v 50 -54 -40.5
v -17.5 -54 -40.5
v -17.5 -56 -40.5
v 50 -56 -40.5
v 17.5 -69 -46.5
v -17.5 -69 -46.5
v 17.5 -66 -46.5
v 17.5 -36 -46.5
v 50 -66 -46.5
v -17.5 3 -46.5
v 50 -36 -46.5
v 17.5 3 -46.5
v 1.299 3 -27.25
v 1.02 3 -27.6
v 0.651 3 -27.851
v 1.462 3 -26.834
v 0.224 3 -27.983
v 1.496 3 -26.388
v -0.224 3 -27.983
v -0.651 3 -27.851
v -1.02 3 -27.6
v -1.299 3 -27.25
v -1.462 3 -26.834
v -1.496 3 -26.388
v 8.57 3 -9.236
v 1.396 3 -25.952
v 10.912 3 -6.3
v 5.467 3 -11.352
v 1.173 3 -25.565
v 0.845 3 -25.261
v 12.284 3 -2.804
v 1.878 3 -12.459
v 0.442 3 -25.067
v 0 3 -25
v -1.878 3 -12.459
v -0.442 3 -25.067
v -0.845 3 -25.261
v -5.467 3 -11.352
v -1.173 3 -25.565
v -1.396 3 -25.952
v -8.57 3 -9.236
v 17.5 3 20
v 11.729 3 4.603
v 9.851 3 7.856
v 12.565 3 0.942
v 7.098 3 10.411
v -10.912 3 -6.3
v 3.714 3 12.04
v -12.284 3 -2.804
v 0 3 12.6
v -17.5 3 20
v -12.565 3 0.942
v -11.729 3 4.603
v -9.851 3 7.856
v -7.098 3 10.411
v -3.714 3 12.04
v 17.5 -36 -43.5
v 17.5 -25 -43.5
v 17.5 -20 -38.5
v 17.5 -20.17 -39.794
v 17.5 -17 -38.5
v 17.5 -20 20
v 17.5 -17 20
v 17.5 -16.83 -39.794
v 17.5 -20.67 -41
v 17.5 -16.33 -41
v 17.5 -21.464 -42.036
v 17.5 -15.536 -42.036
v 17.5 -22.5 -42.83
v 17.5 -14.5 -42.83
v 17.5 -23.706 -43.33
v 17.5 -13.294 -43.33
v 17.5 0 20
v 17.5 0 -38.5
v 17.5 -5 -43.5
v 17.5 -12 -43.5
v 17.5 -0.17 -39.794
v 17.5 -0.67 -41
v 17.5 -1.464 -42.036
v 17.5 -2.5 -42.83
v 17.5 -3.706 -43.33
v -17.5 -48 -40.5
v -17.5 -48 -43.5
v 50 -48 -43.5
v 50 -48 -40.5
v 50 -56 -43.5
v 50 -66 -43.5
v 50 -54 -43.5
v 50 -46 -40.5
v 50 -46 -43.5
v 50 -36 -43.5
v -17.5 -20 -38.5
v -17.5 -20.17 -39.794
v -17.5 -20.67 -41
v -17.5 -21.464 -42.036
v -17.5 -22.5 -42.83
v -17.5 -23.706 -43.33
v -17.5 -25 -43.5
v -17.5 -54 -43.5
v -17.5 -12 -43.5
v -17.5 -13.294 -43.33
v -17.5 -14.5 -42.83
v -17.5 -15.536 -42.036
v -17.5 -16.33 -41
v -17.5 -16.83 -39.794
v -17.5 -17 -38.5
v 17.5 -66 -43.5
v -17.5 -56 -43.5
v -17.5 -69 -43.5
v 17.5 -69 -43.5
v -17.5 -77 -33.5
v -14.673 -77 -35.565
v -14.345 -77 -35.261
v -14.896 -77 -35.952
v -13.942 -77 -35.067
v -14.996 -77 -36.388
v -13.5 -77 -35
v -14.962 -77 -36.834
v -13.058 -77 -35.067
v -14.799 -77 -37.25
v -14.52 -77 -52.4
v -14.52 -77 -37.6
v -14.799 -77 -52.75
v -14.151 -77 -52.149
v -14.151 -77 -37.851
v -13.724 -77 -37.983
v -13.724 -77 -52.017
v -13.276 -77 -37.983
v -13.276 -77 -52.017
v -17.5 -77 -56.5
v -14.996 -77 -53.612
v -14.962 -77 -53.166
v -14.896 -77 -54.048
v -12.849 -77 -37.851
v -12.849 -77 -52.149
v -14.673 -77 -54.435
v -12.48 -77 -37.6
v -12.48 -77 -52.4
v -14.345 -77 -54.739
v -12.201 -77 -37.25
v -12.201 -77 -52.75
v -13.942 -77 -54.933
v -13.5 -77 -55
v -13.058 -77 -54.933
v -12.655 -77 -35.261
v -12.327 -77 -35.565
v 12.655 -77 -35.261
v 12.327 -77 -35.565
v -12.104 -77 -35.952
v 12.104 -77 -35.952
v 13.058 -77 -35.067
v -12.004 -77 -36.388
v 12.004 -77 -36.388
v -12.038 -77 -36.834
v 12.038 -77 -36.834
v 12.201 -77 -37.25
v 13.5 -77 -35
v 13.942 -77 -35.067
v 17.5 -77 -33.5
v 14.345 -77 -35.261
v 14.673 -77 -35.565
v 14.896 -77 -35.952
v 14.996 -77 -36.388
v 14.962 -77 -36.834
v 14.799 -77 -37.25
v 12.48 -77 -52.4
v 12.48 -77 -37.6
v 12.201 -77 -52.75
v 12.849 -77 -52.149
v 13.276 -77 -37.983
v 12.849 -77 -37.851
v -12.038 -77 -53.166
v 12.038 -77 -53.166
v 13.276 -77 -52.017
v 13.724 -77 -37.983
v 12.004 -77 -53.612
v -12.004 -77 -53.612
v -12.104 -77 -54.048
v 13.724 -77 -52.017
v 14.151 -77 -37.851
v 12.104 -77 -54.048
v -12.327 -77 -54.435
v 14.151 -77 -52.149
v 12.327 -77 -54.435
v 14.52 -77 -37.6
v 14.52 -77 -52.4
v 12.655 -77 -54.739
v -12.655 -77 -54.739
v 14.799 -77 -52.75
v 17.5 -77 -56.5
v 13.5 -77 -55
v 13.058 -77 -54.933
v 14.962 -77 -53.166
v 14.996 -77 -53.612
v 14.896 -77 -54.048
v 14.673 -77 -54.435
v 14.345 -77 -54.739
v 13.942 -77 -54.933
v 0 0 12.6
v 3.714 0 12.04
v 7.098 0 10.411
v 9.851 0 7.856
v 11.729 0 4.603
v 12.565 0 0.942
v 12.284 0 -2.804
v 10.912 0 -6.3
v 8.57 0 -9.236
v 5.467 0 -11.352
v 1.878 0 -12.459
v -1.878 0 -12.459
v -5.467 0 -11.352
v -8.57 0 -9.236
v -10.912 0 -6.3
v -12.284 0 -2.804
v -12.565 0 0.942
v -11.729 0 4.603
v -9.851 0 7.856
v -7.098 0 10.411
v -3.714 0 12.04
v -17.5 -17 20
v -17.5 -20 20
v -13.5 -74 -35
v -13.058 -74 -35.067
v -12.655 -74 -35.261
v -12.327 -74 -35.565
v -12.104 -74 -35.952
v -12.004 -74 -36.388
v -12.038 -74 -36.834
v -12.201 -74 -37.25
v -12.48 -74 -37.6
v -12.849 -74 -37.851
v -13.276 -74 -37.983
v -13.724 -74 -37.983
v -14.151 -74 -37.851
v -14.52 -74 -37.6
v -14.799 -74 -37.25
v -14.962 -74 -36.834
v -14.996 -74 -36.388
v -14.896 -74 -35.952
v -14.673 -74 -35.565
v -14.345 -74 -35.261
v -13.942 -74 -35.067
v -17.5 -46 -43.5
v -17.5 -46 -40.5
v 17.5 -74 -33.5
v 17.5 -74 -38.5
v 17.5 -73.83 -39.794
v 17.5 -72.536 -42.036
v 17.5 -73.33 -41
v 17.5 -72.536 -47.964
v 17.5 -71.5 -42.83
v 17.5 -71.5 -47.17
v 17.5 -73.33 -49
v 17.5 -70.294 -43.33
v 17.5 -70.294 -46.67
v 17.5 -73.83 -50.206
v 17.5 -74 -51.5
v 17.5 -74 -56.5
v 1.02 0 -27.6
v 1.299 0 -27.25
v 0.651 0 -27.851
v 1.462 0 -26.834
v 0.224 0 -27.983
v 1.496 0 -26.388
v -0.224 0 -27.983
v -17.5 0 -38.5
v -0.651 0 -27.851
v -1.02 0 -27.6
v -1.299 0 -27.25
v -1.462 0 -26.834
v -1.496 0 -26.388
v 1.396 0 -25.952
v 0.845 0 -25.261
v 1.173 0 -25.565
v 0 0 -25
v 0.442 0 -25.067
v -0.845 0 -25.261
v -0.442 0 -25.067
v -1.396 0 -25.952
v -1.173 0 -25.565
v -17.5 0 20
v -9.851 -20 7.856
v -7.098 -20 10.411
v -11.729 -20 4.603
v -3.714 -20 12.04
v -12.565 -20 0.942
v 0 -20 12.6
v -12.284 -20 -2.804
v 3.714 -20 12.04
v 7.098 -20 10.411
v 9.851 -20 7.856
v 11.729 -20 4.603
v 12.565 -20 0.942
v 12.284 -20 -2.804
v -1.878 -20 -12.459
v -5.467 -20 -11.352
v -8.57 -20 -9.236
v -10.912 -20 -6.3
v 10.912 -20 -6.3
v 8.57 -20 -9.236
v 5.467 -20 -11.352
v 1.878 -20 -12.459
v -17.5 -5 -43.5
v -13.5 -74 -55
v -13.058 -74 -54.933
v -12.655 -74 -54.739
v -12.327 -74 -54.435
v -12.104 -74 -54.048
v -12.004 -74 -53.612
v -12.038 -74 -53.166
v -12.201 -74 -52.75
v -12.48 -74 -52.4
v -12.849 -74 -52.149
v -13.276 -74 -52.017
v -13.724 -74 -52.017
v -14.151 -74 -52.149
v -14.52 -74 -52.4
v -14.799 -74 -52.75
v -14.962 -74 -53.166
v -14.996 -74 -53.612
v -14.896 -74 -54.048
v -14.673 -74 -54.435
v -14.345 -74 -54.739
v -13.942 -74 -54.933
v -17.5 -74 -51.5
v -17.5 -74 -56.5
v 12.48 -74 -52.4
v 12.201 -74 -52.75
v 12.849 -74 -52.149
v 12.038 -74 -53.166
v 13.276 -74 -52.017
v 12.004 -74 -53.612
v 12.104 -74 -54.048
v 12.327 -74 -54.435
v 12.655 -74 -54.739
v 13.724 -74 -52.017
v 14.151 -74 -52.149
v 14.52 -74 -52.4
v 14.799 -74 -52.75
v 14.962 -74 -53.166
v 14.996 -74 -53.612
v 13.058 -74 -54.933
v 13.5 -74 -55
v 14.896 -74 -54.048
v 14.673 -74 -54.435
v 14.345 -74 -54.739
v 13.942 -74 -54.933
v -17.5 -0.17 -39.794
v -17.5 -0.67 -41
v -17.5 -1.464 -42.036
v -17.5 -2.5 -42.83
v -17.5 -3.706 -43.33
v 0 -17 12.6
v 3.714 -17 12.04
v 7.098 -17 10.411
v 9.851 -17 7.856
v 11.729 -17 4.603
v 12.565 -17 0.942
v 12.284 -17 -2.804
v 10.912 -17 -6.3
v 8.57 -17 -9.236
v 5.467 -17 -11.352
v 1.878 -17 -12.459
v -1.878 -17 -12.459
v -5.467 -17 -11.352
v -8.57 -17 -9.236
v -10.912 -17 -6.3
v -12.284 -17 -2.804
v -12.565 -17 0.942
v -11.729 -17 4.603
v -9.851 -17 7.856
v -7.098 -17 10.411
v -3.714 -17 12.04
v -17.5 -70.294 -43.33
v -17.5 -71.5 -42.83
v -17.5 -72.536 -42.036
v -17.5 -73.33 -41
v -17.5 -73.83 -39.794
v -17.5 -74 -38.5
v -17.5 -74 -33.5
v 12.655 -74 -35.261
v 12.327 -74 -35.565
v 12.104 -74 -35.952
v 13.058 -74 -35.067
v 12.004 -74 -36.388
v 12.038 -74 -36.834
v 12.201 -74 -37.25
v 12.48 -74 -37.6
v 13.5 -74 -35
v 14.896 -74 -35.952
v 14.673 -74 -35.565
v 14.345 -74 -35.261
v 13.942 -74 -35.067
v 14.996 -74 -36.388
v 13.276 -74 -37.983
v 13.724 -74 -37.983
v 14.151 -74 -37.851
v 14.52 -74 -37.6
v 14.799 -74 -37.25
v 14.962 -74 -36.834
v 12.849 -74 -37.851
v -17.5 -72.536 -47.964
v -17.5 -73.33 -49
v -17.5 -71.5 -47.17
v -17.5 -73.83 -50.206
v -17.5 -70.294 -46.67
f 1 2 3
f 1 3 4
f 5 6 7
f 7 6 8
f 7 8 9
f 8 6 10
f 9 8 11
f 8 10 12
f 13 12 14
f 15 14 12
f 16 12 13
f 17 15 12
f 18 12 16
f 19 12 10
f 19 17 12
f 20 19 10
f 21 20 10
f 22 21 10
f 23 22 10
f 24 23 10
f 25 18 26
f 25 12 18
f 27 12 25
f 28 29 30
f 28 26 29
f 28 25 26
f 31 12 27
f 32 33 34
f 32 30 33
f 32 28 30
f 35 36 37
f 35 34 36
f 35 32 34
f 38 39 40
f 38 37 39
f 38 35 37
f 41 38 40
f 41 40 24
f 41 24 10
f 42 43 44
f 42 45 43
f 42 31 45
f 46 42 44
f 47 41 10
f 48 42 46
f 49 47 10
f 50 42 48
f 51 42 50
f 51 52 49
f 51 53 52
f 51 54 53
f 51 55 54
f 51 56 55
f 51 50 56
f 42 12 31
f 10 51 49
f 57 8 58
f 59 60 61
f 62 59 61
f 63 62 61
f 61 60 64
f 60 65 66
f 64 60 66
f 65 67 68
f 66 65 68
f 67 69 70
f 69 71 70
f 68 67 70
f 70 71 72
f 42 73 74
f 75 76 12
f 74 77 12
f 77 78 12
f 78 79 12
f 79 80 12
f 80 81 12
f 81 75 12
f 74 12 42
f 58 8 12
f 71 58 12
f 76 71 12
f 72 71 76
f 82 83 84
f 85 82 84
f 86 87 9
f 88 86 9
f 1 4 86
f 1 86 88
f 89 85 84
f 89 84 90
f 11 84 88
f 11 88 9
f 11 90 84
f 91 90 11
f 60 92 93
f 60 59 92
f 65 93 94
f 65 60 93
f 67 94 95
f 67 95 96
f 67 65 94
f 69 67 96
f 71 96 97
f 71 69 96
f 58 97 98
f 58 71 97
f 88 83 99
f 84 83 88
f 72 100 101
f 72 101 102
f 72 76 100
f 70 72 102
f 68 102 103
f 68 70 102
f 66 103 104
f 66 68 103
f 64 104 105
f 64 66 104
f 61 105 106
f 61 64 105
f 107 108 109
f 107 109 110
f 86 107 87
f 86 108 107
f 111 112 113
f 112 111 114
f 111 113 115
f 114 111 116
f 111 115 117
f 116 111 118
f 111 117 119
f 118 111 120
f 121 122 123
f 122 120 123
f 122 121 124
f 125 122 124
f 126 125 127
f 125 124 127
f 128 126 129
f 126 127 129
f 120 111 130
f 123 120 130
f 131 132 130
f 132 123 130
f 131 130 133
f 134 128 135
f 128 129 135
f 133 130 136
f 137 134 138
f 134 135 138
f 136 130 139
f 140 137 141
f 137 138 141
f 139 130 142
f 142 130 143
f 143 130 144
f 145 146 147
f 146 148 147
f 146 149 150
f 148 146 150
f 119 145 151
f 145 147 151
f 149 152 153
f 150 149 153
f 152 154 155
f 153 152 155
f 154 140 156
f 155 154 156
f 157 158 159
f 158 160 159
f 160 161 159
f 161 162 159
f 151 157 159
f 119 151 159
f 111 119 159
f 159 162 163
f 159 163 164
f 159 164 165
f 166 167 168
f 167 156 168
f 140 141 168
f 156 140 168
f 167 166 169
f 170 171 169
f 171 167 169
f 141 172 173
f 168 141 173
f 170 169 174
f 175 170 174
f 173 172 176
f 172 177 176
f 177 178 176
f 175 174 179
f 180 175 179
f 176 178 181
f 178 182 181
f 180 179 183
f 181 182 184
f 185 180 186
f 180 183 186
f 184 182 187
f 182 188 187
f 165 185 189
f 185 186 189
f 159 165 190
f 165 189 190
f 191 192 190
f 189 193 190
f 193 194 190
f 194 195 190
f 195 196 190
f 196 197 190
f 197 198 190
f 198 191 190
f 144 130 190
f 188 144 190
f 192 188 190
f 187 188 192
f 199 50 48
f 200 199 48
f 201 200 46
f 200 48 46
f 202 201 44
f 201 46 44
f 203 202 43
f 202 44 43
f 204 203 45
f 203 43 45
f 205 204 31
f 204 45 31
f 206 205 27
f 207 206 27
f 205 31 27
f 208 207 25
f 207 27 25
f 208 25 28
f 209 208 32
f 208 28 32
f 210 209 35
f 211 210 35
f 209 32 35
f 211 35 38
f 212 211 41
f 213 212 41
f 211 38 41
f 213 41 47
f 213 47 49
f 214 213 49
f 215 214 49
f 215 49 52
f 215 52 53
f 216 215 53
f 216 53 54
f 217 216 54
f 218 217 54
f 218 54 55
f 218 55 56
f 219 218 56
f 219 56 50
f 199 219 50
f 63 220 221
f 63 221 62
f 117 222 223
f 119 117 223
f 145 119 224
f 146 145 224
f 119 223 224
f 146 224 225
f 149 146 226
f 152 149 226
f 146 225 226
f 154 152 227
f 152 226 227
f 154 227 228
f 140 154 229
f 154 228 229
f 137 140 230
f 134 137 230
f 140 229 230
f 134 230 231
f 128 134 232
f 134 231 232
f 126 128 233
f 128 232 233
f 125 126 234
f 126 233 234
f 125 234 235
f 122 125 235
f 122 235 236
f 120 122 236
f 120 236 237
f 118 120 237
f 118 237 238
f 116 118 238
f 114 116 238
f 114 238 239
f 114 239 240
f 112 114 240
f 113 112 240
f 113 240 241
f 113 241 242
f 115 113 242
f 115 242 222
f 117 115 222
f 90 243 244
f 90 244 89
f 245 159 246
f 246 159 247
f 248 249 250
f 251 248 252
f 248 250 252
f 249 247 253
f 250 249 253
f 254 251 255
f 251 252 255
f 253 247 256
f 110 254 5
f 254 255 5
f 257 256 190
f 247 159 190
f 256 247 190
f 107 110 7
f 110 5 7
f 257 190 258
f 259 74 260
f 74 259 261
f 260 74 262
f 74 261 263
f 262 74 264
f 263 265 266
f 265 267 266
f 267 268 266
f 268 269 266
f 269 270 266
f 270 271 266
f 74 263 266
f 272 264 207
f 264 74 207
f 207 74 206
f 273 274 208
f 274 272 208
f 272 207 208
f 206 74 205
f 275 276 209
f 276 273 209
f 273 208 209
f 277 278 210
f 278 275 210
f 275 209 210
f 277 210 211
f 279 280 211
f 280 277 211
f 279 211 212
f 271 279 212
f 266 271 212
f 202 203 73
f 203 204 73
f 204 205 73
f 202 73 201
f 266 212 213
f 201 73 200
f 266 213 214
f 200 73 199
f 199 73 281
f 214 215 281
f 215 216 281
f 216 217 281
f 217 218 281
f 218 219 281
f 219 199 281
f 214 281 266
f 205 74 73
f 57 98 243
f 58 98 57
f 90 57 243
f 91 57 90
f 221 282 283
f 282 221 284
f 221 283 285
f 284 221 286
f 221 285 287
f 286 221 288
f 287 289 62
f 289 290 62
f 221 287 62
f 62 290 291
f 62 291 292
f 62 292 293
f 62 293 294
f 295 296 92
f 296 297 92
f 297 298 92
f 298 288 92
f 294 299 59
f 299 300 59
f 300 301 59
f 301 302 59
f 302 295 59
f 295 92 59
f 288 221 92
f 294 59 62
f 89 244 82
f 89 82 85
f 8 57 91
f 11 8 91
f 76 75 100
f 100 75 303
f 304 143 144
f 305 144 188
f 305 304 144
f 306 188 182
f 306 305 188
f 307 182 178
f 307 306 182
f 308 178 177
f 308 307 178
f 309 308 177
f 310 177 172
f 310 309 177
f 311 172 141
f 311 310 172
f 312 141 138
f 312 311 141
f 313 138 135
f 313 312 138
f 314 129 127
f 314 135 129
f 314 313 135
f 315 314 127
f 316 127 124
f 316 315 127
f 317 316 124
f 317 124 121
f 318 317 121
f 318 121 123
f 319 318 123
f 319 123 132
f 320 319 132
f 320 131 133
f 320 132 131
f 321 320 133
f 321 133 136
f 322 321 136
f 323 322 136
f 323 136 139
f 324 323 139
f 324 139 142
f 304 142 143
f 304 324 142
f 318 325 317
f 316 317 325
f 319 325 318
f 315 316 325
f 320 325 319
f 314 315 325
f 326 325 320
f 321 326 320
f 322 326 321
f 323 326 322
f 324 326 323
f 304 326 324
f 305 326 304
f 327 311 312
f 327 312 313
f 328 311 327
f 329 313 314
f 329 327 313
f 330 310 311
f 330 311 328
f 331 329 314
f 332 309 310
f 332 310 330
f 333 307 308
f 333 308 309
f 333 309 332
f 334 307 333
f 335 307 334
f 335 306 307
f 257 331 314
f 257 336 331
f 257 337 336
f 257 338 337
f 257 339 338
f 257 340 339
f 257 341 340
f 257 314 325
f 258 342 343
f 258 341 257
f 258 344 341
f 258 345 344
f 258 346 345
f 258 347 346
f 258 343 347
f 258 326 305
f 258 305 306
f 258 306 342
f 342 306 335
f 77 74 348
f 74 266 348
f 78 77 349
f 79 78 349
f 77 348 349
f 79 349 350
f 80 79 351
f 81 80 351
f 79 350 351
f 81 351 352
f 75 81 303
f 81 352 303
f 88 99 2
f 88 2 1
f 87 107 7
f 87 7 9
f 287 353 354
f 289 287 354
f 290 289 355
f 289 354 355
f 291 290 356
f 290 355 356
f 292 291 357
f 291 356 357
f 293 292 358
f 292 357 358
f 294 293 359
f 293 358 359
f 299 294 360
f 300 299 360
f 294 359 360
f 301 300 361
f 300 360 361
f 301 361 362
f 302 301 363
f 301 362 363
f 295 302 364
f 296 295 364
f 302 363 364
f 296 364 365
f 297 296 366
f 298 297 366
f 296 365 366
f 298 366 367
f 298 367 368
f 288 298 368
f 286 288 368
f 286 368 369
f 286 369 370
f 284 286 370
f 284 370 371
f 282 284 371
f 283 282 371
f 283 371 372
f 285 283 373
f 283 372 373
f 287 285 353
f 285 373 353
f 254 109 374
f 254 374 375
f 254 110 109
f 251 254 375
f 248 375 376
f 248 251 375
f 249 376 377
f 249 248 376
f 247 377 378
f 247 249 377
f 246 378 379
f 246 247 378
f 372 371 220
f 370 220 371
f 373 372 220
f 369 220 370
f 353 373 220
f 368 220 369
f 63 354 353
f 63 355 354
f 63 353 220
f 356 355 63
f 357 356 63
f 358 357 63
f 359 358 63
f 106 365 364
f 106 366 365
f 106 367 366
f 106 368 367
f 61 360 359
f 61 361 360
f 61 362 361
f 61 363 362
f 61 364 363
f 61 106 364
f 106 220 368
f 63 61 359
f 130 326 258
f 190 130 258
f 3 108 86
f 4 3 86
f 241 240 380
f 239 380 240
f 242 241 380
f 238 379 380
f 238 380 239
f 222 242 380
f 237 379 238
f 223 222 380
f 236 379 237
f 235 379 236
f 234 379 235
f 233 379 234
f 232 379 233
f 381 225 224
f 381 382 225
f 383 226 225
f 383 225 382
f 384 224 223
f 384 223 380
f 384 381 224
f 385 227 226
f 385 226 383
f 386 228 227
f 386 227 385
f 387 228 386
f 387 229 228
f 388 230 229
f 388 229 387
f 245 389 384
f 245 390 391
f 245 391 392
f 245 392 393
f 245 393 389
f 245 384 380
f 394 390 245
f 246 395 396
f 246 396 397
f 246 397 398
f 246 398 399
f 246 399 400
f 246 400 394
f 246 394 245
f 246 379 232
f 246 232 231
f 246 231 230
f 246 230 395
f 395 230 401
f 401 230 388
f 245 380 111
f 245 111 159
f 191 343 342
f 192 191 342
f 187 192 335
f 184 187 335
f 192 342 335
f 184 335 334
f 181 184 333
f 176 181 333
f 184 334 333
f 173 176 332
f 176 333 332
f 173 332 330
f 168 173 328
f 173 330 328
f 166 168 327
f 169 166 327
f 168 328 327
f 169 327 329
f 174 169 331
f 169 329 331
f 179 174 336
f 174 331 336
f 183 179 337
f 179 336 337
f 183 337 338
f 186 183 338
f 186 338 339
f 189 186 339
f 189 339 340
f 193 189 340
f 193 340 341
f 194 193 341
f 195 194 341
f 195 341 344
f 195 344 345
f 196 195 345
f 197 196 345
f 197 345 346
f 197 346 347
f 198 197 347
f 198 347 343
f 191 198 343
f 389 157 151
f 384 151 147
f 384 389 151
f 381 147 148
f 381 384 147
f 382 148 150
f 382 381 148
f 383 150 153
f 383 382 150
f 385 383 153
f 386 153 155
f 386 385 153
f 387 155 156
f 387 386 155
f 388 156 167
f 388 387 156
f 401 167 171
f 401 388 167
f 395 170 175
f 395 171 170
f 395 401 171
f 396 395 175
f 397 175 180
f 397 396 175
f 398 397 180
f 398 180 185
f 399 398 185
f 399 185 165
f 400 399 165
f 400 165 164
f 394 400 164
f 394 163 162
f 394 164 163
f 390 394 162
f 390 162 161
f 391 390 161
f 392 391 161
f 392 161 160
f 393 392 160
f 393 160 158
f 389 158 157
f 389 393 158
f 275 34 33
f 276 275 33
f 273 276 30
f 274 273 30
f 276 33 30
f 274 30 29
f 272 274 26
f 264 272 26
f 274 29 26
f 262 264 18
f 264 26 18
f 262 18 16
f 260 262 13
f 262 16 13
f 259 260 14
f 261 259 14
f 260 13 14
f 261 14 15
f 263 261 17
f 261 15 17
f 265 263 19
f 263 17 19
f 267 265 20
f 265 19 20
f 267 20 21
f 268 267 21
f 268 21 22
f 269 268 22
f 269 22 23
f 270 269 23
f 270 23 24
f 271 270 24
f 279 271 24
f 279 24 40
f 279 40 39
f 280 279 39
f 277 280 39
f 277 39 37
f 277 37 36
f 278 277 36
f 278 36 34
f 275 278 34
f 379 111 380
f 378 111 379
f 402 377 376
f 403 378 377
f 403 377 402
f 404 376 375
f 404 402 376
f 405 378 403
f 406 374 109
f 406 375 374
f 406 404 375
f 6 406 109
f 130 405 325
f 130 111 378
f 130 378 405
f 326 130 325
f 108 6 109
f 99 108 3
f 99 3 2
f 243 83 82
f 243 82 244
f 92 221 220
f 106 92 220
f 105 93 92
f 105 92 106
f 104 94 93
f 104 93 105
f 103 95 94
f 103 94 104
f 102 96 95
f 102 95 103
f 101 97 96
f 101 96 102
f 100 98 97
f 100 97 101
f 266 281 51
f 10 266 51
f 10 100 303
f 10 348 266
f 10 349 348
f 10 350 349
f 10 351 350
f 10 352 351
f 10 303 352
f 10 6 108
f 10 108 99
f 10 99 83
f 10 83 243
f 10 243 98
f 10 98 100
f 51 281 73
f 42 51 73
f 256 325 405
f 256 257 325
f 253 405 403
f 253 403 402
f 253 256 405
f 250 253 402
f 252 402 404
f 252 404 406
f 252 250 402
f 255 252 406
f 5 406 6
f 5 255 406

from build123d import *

# Parameters (mm, degrees)
SKETCH1_W                = 35
SKETCH1_H                = 40
BOSS_EXTRUDE1_DEPTH      = 3
SKETCH2_R                = 12.6
CUT_EXTRUDE1_DEPTH       = 27.744158241
SKETCH4_W                = 35
SKETCH4_H                = 3
BOSS_EXTRUDE2_DEPTH      = 23.5
SKETCH5_W                = 35
SKETCH5_H                = 80
BOSS_EXTRUDE3_DEPTH      = 3
SKETCH6_W                = 35
SKETCH6_H                = 63.5
SKETCH6_R                = 12.6
BOSS_EXTRUDE4_DEPTH      = 3
BOSS_EXTRUDE5_DEPTH      = 10
BOSS_EXTRUDE5_DEPTH_BACK = 13
SKETCH7_W                = 35
SKETCH7_H                = 3
FILLET1_R                = 5
SKETCH8_W                = 100
SKETCH8_H                = 30
BOSS_EXTRUDE6_DEPTH      = 3
SKETCH10_W               = 100
SKETCH10_H               = 2
BOSS_EXTRUDE8_DEPTH      = 3
SKETCH12_R               = 1.5
CUT_EXTRUDE3_DEPTH       = 108.801901653
MIRROR2_COPY_1_SKETCH_R  = 1.5
MIRROR2_COPY_1_DEPTH     = 108.801901653
CUT_EXTRUDE4_DEPTH       = 32.5
SKETCH26_R               = 1.5
CUT_EXTRUDE17_DEPTH      = 10


with BuildPart() as part:
    # Sketch1 → Boss-Extrude1 (new body)
    with BuildSketch(Plane(origin=(0, 0, 0), x_dir=(1, 0, 0), z_dir=(0, 1, 0))):
        Rectangle(SKETCH1_W, SKETCH1_H)
    extrude(amount=BOSS_EXTRUDE1_DEPTH)

    # Sketch2 → Cut-Extrude1 (cut, through all)
    with BuildSketch(Plane(origin=(0, 3, 0), x_dir=(1, 0, 0), z_dir=(0, 1, 0))):
        with Locations(Location((0, 0, 0), (0, 0, 270))):
            Circle(SKETCH2_R)
    extrude(amount=-CUT_EXTRUDE1_DEPTH, mode=Mode.SUBTRACT)

    # Sketch4 → Boss-Extrude2 (add)
    with BuildSketch(Plane(origin=(0, 0, -20), x_dir=(-1, 0, 0), z_dir=(0, 0, -1))):
        with Locations((0, 1.5)):
            Rectangle(SKETCH4_W, SKETCH4_H)
    extrude(amount=BOSS_EXTRUDE2_DEPTH)

    # Sketch5 → Boss-Extrude3 (add)
    with BuildSketch(Plane(origin=(0, 0, -43.5), x_dir=(-1, 0, 0), z_dir=(0, 0, -1))):
        with Locations((0, -37)):
            Rectangle(SKETCH5_W, SKETCH5_H)
    extrude(amount=BOSS_EXTRUDE3_DEPTH)

    # Sketch6 → Boss-Extrude4 (add)
    with BuildSketch(Plane(origin=(0, -17, 0), x_dir=(1, 0, 0), z_dir=(0, 1, 0))):
        with Locations((0, 11.75)):
            Rectangle(SKETCH6_W, SKETCH6_H)
        with Locations(Location((0, 0, 0), (0, 0, 270))):
            Circle(SKETCH6_R, mode=Mode.SUBTRACT)
    extrude(amount=-BOSS_EXTRUDE4_DEPTH)

    # Sketch7 → Boss-Extrude5 (add, two sides: drawn at the far end of the back side and taken through both)
    with BuildSketch(Plane.XY.offset(-43.5).offset(-BOSS_EXTRUDE5_DEPTH_BACK)):
        with Locations((0, -75.5)):
            Rectangle(SKETCH7_W, SKETCH7_H)
    extrude(amount=BOSS_EXTRUDE5_DEPTH + BOSS_EXTRUDE5_DEPTH_BACK)

    # Fillet1
    fillet1_edges = [part.edges().sort_by_distance(p)[0] for p in [
        (0, 0, -43.5),
        (0, -20, -43.5),
        (0, -17, -43.5),
        (0, -74, -46.5),
        (0, -74, -43.5),
    ]]
    fillet(fillet1_edges, radius=FILLET1_R)

    # Sketch8 → Boss-Extrude6 (add)
    with BuildSketch(Plane.XY.offset(-43.5)):
        with Locations((0, -51)):
            Rectangle(SKETCH8_W, SKETCH8_H)
    extrude(amount=-BOSS_EXTRUDE6_DEPTH)

    # Sketch10 → Boss-Extrude8 (add)
    with BuildSketch(Plane.XY.offset(-43.5)):
        with Locations((0, -47)):
            Rectangle(SKETCH10_W, SKETCH10_H)
        with Locations((0, -55)):
            Rectangle(SKETCH10_W, SKETCH10_H)
    extrude(amount=BOSS_EXTRUDE8_DEPTH)

    # Sketch12 → Cut-Extrude3 (cut, through all)
    with BuildSketch(Plane(origin=(0, -74, 0), x_dir=(1, 0, 0), z_dir=(0, 1, 0))):
        with Locations(Location((-13.5, 36.5, 0), (0, 0, 270))):
            Circle(SKETCH12_R)
    cut_extrude3 = extrude(amount=-CUT_EXTRUDE3_DEPTH, mode=Mode.SUBTRACT)

    # Mirror1: Cut-Extrude3 across plane
    add(cut_extrude3.mirror(Plane.ZY), mode=Mode.SUBTRACT)

    # Mirror2: Cut-Extrude3 across plane
    add(cut_extrude3.mirror(Plane(origin=(0, 0, -45), x_dir=(1, 0, 0), z_dir=(0, 0, -1))), mode=Mode.SUBTRACT)

    # Mirror2 copy 1 sketch → Mirror2 copy 1 (cut, through all)
    with BuildSketch(Plane(origin=(0, -74, -90), x_dir=(-1, 0, 0), z_dir=(0, 1, 0))):
        with Locations(Location((-13.5, 36.5, 0), (0, 0, 270))):
            Circle(MIRROR2_COPY_1_SKETCH_R)
    extrude(amount=-MIRROR2_COPY_1_DEPTH, mode=Mode.SUBTRACT)

    # Sketch13 → Cut-Extrude4 (cut)
    with BuildSketch(Plane.ZY.offset(50)):
        Polygon((-43.5, -36), (-46.5, -36), (-46.5, -66), (-43.5, -66), (-43.5, -56), (-40.5, -56), (-40.5, -54), (-43.5, -54), (-43.5, -48), (-40.5, -48), (-40.5, -46), (-43.5, -46), align=None)
    extrude(amount=-CUT_EXTRUDE4_DEPTH, mode=Mode.SUBTRACT)

    # Sketch26 → Cut-Extrude17 (cut)
    with BuildSketch(Plane(origin=(0, 3, 0), x_dir=(1, 0, 0), z_dir=(0, 1, 0))):
        with Locations(Location((0, 26.5, 0), (0, 0, 270))):
            Circle(SKETCH26_R)
    extrude(amount=-CUT_EXTRUDE17_DEPTH, mode=Mode.SUBTRACT)


solid = part.part
